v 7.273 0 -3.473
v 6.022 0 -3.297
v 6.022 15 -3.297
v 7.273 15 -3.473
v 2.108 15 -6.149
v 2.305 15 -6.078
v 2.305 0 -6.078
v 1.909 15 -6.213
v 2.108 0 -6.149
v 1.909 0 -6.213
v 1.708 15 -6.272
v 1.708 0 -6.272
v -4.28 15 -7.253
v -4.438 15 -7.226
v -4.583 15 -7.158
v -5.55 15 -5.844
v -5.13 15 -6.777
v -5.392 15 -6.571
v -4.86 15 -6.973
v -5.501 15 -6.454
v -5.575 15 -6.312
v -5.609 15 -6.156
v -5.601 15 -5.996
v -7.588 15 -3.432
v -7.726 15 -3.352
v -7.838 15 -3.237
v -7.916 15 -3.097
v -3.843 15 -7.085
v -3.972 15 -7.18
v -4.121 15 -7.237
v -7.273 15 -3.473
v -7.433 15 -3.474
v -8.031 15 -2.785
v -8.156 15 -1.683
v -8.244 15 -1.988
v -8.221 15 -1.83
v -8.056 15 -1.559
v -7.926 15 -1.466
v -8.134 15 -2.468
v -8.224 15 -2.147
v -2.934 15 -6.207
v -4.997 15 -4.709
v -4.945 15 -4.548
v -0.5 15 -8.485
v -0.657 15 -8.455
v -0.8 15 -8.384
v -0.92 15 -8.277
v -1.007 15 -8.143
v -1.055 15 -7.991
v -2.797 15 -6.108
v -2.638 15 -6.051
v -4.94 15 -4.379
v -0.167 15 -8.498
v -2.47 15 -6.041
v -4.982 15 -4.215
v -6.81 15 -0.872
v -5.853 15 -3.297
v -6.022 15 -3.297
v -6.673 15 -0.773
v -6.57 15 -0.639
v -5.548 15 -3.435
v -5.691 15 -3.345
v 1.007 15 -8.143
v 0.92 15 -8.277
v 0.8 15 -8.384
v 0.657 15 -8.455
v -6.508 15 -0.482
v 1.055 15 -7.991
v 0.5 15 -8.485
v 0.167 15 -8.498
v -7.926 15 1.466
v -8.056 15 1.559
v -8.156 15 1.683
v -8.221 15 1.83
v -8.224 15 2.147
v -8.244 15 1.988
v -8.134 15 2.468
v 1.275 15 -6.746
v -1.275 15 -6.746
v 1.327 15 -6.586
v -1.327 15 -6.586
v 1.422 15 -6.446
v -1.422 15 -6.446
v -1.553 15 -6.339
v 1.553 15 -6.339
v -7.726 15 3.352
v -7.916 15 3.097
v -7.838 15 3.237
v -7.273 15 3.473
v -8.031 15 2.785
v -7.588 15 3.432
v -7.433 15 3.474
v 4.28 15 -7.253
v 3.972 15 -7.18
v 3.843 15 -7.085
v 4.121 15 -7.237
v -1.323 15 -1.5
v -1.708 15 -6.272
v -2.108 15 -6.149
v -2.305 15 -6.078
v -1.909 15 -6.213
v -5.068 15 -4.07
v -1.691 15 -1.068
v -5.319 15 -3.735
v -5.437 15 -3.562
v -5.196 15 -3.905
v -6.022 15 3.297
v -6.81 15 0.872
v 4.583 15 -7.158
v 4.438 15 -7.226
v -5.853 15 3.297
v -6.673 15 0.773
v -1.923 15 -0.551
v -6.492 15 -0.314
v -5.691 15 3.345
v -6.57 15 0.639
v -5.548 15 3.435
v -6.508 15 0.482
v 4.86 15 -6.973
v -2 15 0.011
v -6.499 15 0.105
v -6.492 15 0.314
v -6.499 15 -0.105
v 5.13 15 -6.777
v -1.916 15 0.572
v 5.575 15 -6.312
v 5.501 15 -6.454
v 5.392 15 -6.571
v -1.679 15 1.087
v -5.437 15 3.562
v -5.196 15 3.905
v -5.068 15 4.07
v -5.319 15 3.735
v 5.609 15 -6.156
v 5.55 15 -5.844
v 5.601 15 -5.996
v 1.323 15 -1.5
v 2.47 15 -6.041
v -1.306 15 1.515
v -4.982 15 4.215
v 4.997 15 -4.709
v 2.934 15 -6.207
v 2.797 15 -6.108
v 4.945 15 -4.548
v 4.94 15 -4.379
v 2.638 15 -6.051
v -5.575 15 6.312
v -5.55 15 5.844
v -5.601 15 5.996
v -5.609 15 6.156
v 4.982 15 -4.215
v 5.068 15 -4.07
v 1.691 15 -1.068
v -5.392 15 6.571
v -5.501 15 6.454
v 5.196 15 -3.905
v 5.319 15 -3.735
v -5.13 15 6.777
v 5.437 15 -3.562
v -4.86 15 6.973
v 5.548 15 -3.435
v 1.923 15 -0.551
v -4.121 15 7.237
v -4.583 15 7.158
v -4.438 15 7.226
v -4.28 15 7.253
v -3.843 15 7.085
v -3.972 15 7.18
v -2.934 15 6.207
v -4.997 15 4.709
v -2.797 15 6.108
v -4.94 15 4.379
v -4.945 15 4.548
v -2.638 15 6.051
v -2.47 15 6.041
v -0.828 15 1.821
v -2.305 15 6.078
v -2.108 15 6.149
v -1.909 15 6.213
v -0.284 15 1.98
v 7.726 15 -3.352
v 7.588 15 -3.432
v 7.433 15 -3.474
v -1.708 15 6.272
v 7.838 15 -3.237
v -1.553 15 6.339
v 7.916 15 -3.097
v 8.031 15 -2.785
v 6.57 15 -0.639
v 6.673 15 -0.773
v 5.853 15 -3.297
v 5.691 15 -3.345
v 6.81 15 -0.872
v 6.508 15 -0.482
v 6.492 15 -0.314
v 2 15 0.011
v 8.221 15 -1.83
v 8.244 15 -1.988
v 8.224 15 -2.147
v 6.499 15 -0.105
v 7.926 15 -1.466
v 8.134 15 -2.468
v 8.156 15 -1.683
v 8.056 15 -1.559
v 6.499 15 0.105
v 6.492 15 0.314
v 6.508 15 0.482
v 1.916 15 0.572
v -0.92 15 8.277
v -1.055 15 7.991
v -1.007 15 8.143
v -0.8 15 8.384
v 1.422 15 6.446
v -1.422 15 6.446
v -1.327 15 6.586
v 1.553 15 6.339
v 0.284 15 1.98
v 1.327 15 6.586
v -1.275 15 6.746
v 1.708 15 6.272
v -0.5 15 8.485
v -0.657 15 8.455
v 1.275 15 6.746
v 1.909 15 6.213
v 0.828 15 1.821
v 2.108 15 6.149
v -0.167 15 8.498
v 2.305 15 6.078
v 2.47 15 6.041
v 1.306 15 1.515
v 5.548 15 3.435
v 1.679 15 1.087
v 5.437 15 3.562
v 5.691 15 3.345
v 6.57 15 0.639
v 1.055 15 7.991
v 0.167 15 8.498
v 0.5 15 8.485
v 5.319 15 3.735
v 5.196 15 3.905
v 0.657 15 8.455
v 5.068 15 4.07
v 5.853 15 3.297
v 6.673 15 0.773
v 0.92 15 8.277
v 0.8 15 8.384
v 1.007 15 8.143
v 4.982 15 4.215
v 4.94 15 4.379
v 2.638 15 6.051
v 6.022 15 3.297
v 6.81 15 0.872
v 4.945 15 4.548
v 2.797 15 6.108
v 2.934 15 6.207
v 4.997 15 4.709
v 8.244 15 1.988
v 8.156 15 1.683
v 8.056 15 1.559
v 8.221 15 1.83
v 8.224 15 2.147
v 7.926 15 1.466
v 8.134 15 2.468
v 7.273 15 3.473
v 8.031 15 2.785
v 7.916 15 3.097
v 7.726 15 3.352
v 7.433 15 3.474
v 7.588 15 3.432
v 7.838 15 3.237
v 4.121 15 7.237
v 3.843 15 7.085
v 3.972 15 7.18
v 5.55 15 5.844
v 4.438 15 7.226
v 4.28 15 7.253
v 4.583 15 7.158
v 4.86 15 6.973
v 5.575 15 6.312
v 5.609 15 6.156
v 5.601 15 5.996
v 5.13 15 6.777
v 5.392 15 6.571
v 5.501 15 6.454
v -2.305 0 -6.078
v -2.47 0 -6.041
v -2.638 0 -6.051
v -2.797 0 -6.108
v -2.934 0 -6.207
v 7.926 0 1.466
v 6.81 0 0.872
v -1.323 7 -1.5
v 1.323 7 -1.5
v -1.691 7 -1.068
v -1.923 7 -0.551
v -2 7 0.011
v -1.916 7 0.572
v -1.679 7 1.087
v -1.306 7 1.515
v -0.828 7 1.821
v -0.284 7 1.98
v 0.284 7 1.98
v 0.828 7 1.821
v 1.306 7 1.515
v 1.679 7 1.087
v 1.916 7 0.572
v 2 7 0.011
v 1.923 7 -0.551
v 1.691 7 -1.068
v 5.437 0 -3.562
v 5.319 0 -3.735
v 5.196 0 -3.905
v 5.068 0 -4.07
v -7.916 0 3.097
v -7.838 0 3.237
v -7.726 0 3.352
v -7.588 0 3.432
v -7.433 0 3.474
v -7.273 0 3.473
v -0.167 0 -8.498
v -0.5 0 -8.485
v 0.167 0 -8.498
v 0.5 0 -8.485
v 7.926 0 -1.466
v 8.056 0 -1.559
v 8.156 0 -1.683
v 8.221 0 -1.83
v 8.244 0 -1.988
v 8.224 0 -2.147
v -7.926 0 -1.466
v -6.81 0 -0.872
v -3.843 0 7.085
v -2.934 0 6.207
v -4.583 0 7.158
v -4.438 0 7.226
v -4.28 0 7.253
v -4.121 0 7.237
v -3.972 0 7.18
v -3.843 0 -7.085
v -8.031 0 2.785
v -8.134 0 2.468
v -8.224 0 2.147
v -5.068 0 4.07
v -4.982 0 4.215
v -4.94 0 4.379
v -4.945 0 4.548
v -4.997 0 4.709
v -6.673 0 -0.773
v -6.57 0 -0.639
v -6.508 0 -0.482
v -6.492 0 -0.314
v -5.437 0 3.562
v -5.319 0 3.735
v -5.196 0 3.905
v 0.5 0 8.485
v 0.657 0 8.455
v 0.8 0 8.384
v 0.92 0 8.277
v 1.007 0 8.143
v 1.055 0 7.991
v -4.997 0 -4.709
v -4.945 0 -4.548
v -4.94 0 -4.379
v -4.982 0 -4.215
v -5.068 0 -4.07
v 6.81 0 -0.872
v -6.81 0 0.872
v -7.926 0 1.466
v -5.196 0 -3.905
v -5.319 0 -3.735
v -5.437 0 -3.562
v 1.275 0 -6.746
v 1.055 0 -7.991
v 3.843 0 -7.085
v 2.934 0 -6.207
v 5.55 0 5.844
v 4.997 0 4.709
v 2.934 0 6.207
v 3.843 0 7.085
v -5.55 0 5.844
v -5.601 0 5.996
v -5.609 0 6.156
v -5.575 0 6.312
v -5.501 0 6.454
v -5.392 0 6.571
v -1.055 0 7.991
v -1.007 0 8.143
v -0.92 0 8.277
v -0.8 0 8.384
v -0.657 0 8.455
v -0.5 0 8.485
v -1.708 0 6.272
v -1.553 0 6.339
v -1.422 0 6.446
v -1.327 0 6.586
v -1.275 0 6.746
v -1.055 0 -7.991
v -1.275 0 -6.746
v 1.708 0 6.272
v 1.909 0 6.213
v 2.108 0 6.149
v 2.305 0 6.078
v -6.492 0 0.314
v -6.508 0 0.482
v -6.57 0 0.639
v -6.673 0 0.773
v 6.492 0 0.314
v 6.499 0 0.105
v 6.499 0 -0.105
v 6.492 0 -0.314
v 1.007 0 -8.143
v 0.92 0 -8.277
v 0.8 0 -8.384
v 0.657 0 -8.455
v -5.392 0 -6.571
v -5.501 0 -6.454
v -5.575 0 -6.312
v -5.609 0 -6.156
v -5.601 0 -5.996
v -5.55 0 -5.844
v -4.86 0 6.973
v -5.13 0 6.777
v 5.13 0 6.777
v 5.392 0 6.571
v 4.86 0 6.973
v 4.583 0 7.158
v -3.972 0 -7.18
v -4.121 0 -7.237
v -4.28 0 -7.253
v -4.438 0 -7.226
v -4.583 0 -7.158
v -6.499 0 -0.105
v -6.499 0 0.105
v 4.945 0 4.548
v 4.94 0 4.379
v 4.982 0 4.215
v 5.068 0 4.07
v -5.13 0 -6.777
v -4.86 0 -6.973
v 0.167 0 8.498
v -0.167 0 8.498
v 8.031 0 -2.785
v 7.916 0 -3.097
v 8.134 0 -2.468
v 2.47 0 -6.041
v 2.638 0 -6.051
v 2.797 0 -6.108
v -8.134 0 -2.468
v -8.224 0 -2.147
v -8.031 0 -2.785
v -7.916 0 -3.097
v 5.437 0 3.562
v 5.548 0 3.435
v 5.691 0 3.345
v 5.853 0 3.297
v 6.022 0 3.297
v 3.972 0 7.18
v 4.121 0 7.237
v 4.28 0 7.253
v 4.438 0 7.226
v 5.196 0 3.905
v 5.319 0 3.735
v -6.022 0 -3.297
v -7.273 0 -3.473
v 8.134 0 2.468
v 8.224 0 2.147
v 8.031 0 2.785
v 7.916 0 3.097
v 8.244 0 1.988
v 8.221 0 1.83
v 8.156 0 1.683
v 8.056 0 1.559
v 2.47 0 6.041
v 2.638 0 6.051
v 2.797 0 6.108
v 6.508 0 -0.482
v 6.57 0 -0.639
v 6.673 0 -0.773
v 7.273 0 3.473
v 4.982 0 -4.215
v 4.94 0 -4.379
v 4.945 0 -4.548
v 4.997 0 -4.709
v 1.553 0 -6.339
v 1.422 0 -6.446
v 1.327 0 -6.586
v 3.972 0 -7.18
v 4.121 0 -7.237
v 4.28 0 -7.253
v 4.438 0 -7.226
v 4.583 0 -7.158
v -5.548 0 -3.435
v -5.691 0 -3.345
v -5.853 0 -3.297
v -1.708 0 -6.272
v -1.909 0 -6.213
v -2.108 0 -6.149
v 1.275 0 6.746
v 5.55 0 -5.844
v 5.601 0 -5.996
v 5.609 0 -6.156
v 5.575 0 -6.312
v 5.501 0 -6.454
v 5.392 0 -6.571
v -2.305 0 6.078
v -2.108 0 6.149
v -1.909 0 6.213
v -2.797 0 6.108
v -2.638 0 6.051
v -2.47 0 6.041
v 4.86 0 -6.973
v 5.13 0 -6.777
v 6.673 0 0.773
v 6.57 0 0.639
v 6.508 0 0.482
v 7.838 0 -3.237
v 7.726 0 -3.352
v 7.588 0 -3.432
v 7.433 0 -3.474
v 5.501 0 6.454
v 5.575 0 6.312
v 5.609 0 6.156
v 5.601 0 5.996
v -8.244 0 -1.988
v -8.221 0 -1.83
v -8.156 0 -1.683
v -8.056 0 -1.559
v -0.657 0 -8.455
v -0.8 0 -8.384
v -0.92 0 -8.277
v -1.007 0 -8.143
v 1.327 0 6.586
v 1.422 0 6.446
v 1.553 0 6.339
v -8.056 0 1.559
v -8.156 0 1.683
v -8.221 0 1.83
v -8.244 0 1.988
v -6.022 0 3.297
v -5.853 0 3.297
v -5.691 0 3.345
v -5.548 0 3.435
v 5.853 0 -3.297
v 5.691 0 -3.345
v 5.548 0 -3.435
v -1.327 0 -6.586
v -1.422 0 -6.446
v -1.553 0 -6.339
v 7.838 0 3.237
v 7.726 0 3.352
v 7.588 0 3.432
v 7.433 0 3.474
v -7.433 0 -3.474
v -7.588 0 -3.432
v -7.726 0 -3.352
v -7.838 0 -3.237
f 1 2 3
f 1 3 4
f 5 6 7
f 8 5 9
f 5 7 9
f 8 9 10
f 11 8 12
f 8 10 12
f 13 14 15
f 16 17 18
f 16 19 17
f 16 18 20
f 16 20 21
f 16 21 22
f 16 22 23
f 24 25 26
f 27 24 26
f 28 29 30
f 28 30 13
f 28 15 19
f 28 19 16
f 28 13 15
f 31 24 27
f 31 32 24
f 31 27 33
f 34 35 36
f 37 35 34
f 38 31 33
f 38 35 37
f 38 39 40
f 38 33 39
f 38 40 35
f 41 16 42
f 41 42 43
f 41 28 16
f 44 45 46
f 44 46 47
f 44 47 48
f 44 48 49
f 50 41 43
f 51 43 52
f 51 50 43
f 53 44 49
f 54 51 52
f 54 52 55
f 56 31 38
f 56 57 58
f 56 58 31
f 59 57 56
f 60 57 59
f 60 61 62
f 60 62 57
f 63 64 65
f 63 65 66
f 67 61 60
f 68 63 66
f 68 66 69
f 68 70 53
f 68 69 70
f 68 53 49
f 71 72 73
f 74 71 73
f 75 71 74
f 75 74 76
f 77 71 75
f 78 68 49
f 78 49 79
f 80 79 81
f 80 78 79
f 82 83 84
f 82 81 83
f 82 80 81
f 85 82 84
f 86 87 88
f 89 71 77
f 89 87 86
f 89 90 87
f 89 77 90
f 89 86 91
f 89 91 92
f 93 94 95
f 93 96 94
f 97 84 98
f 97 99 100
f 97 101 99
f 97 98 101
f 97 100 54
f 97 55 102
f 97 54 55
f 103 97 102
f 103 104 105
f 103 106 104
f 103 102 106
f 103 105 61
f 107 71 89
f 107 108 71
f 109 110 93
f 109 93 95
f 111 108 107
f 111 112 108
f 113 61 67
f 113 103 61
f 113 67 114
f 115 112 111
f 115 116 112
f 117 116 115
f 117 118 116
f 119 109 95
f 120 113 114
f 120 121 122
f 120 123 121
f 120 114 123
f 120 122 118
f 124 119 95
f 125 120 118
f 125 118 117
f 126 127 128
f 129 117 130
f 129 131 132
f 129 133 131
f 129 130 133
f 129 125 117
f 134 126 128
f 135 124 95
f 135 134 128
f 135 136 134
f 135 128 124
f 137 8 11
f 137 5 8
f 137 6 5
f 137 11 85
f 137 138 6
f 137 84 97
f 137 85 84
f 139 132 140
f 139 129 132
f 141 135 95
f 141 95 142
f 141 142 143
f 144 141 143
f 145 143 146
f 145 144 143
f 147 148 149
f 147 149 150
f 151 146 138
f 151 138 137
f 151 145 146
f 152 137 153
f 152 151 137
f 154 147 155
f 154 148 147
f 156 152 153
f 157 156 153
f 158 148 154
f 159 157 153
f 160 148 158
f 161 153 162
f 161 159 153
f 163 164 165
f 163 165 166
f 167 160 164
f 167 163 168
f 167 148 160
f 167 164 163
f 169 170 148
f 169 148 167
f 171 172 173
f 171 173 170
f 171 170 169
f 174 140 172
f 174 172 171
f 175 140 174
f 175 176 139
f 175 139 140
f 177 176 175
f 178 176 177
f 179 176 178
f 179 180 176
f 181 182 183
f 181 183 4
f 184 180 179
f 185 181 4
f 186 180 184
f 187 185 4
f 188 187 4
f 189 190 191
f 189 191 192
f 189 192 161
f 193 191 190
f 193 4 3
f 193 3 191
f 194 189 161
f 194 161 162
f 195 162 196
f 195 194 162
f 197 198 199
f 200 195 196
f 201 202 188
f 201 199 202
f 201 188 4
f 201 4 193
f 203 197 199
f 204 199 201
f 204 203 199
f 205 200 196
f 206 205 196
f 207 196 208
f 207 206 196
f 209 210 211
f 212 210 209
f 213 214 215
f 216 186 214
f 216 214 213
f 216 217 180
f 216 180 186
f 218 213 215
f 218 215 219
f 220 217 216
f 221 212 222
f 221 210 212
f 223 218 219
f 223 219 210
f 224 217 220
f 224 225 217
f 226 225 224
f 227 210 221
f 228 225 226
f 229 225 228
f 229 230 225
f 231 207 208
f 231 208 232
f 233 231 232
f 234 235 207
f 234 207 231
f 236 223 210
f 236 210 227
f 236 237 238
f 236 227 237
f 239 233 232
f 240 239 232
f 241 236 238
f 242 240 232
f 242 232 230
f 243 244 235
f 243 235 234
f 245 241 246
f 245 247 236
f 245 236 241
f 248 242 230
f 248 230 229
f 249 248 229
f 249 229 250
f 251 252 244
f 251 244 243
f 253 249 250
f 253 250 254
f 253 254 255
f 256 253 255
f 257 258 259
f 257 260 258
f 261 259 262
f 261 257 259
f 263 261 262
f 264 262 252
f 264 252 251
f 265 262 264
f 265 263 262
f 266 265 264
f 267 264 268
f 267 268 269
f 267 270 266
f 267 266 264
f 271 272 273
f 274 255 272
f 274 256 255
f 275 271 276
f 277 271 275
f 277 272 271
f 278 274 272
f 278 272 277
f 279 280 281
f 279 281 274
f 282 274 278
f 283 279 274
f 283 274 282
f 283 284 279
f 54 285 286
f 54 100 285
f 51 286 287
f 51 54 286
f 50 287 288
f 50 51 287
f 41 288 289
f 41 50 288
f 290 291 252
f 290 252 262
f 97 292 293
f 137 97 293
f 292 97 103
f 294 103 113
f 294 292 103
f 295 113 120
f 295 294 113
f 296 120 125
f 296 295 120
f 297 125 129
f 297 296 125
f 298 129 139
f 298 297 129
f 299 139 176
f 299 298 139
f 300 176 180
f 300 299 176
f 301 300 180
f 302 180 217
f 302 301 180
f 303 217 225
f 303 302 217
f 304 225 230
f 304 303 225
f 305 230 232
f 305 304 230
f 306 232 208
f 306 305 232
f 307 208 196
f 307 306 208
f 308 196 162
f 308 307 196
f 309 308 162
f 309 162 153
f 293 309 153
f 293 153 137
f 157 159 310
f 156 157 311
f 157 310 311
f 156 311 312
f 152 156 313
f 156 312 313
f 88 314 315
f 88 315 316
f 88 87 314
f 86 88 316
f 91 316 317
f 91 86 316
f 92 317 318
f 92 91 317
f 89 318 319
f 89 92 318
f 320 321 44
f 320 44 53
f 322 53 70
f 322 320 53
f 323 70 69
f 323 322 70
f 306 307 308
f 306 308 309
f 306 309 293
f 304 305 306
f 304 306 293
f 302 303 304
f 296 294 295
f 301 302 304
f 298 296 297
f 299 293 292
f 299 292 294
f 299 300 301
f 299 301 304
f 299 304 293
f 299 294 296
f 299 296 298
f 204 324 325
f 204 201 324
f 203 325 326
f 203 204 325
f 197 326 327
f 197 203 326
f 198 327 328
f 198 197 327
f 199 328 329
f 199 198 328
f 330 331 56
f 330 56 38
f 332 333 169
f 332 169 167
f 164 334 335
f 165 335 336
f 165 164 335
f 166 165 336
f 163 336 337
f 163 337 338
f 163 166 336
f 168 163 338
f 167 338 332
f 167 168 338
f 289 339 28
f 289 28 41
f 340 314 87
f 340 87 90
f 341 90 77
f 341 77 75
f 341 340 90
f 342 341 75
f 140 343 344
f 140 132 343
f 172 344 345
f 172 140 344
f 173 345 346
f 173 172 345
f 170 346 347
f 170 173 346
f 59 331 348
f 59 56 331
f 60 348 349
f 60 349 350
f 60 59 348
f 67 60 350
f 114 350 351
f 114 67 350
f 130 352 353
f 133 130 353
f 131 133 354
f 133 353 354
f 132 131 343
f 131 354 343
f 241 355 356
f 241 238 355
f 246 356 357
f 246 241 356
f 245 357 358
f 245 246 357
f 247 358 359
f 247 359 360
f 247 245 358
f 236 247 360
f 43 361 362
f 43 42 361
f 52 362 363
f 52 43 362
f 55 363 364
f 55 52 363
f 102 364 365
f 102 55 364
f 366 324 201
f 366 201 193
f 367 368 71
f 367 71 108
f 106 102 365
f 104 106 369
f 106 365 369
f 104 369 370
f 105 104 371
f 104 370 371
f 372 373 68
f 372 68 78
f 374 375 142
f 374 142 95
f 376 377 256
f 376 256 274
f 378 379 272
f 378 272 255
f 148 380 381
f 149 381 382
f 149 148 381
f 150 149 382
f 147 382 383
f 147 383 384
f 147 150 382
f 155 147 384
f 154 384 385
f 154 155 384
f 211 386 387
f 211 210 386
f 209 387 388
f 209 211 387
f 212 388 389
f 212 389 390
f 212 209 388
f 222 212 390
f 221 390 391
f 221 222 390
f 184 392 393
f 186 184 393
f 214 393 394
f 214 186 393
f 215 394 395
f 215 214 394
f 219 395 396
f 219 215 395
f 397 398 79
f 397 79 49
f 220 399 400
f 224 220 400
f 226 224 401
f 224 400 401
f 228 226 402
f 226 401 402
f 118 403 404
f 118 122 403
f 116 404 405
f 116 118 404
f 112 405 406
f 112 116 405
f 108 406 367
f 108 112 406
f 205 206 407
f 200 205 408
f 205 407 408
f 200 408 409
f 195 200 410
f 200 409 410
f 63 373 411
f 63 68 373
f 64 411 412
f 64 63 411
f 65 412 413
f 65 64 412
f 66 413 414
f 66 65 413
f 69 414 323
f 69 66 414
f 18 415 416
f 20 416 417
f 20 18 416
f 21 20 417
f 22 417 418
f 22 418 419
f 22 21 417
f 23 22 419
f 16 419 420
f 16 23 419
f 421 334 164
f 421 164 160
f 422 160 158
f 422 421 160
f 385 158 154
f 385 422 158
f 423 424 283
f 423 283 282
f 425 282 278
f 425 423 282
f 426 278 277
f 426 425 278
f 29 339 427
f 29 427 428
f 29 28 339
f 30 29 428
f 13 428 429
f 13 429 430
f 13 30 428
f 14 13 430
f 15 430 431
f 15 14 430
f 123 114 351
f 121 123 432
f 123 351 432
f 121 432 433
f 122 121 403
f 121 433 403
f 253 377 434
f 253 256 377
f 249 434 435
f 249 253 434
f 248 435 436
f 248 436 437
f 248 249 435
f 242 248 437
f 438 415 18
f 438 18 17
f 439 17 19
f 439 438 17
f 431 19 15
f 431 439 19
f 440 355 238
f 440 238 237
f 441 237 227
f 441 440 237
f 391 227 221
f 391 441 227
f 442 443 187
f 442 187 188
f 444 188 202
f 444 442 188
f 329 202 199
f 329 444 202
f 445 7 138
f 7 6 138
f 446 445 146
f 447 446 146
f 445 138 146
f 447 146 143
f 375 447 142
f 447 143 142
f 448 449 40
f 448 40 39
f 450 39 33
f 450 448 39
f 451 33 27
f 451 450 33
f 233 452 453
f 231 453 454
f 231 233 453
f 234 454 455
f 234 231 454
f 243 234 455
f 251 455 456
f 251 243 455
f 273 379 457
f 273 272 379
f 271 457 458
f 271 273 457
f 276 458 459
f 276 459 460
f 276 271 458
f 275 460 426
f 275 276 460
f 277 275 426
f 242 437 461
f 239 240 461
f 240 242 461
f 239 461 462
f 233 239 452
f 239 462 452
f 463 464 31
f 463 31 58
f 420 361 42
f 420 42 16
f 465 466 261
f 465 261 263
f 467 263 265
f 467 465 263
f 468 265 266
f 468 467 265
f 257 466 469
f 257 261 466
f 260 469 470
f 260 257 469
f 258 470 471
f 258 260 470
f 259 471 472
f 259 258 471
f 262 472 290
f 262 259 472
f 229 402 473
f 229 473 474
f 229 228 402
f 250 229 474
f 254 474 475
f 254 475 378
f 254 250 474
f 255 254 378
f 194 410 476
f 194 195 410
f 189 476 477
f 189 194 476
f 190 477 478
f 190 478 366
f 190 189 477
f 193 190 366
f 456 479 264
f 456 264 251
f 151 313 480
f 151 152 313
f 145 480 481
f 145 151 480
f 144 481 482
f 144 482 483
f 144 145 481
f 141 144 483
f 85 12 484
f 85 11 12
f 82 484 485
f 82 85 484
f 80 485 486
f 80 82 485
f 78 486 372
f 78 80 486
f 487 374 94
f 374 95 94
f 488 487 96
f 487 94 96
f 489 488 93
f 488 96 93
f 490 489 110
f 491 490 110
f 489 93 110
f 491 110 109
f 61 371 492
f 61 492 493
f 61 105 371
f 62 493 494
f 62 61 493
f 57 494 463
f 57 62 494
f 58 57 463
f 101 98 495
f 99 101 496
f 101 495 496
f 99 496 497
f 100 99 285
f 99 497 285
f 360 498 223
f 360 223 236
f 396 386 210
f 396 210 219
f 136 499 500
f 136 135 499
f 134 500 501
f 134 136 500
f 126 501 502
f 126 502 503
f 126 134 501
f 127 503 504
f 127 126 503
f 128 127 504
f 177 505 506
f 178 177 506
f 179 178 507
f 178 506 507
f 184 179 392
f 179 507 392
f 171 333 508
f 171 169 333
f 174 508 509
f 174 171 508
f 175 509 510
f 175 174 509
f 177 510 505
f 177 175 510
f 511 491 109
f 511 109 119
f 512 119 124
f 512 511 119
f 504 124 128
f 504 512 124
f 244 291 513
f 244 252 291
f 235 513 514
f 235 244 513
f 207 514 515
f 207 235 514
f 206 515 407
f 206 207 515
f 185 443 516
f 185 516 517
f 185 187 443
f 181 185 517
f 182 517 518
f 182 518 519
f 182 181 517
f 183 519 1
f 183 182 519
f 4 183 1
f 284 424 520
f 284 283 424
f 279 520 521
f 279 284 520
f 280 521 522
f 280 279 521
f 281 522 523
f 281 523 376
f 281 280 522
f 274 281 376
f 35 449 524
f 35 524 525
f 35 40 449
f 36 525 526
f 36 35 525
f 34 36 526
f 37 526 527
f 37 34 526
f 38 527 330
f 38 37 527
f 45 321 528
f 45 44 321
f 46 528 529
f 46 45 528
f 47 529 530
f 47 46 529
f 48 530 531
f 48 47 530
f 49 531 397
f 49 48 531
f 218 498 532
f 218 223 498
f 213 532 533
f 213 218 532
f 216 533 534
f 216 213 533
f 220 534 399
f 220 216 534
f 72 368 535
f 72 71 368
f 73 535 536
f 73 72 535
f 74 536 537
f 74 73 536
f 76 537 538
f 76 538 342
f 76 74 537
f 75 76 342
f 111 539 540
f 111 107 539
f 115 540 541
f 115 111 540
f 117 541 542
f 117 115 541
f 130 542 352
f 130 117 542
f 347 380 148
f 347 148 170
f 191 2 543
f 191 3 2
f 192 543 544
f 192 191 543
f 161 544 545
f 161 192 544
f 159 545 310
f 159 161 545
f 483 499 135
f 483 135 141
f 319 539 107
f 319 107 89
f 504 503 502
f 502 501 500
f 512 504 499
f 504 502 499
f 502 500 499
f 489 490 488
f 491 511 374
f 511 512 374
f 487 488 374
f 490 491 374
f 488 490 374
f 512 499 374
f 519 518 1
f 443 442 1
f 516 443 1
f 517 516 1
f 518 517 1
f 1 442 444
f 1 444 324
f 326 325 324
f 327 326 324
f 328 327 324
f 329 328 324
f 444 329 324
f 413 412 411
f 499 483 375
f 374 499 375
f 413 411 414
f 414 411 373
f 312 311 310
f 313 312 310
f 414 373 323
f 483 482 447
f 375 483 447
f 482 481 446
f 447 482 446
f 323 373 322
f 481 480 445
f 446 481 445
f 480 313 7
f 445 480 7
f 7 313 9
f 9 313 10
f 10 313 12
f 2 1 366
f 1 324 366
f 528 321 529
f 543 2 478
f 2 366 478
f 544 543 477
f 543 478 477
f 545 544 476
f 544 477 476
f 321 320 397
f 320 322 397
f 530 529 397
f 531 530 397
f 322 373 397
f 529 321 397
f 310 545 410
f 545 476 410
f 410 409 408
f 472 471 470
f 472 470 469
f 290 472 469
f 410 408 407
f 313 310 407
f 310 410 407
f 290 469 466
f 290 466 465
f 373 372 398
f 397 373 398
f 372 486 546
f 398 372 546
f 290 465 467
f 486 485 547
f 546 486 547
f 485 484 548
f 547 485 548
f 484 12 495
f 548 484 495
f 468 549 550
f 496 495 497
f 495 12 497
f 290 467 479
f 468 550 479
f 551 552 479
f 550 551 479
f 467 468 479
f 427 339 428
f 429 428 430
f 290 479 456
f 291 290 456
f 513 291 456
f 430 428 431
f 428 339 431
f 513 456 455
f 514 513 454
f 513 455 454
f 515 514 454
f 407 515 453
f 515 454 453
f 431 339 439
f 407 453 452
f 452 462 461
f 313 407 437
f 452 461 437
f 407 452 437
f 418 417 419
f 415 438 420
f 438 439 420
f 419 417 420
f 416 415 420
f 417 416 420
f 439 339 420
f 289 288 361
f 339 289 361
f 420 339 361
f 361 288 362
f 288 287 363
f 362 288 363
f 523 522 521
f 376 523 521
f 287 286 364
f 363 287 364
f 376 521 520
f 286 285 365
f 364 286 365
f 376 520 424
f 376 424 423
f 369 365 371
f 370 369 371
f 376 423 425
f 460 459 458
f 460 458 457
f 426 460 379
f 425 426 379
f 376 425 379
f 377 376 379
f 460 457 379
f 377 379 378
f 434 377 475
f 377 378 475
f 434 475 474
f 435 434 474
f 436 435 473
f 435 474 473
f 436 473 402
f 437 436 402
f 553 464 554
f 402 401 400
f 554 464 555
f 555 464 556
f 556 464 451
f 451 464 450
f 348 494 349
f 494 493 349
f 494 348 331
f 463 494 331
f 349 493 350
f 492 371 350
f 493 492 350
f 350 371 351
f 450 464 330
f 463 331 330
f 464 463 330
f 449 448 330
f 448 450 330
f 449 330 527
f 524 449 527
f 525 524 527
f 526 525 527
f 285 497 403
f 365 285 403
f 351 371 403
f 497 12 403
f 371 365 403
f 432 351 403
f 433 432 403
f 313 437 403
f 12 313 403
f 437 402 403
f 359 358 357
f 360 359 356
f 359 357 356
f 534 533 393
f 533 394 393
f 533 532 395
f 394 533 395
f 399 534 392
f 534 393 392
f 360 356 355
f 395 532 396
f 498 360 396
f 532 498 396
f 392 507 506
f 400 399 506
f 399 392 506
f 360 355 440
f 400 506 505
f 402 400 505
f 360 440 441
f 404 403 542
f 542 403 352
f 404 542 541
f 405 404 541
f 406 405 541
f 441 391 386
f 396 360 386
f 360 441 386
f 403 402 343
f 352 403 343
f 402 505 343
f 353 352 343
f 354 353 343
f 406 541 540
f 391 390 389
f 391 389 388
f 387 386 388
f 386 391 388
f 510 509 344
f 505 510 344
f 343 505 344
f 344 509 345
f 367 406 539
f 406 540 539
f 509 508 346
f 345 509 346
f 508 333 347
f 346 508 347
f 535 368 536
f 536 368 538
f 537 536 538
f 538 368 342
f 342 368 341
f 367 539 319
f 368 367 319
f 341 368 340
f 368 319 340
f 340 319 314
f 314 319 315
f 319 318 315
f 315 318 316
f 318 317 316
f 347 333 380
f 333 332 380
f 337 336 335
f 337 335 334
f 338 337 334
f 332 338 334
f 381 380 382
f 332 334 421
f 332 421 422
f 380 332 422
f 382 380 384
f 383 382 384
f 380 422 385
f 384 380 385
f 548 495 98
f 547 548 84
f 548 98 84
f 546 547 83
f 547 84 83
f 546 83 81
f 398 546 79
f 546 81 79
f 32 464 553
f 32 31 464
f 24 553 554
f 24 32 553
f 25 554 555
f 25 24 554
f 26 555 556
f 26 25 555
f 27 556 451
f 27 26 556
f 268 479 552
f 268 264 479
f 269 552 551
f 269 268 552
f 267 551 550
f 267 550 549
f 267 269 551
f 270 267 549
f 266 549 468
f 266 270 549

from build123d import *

# Parameters (mm, degrees)
SKETCH1_R                = 6.5
SKETCH1_R_2              = 2
BOSS_EXTRUDE1_DEPTH      = 15
BOSS_EXTRUDE2_START      = -15
BOSS_EXTRUDE2_DEPTH      = 15
FILLET1_R                = 0.6
CIRPATTERN1_COUNT        = 10
FILLET1_OF_CIRPATTERN1_R = 0.6
BOSS_EXTRUDE3_START      = -15
BOSS_EXTRUDE3_DEPTH      = 15
BOSS_EXTRUDE4_DEPTH      = 7


with BuildPart() as part:
    # Sketch1 → Boss-Extrude1 (new body)
    with BuildSketch(Plane(origin=(0, 0, 0), x_dir=(1, 0, 0), z_dir=(0, 1, 0))):
        with Locations(Location((0, 0, 0), (0, 0, 270))):
            Circle(SKETCH1_R)
        with Locations(Location((0, 0, 0), (0, 0, 270))):
            Circle(SKETCH1_R_2, mode=Mode.SUBTRACT)
    extrude(amount=BOSS_EXTRUDE1_DEPTH)

    # Sketch2 → Boss-Extrude2 (add)
    with BuildSketch(Plane(origin=(0, 15, 0), x_dir=(1, 0, 0), z_dir=(0, 1, 0)).offset(BOSS_EXTRUDE2_START)):
        with BuildLine():
            Line((0.975354337, 8.443854802), (1.342832983, 6.359779837))
            ThreePointArc((1.342832983, 6.359779837), (0, 6.5), (-1.342832983, 6.359779837))
            Line((-1.342832983, 6.359779837), (-0.975354337, 8.443854802))
            ThreePointArc((-0.975354337, 8.443854802), (0, 8.5), (0.975354337, 8.443854802))
        make_face()
    boss_extrude2 = extrude(amount=BOSS_EXTRUDE2_DEPTH)

    # Fillet1
    fillet1_edges = [part.edges().sort_by_distance(p)[0] for p in [
        (-0.975354337, 7.5, -8.443854802),
        (0.975354337, 7.5, -8.443854802),
        (1.342832983, 7.5, -6.359779837),
        (-1.342832983, 7.5, -6.359779837),
    ]]
    fillet(fillet1_edges, radius=FILLET1_R)

    # CirPattern1: Boss-Extrude2 ×10 about axis
    cirpattern1_axis = Axis((0, 0, 0), (0, 1, 0))
    for i in range(1, CIRPATTERN1_COUNT):
        add(boss_extrude2.rotate(cirpattern1_axis, i * 360 / CIRPATTERN1_COUNT))

    # Fillet1 of CirPattern1
    fillet1_of_cirpattern1_edges = [part.edges().sort_by_distance(p)[0] for p in [
        (-5.752251559, 7.5, -6.257923138),
        (-4.174095091, 7.5, -7.404520928),
        (-2.651810092, 7.5, -5.934467393),
        (-4.8245595, 7.5, -4.355872545),
        (-8.331984198, 7.5, -1.681677534),
        (-7.729182066, 7.5, -3.53691173),
        (-5.633551844, 7.5, -3.242390109),
        (-6.463468269, 7.5, -0.688169991),
        (-7.729182066, 7.5, 3.53691173),
        (-8.331984198, 7.5, 1.681677534),
        (-6.463468269, 7.5, 0.688169991),
        (-5.633551844, 7.5, 3.242390109),
        (-4.174095091, 7.5, 7.404520928),
        (-5.752251559, 7.5, 6.257923138),
        (-4.8245595, 7.5, 4.355872545),
        (-2.651810092, 7.5, 5.934467393),
        (0.975354337, 7.5, 8.443854802),
        (-0.975354337, 7.5, 8.443854802),
        (-1.342832983, 7.5, 6.359779837),
        (1.342832983, 7.5, 6.359779837),
        (5.752251559, 7.5, 6.257923138),
        (4.174095091, 7.5, 7.404520928),
        (2.651810092, 7.5, 5.934467393),
        (4.8245595, 7.5, 4.355872545),
        (8.331984198, 7.5, 1.681677534),
        (7.729182066, 7.5, 3.53691173),
        (5.633551844, 7.5, 3.242390109),
        (6.463468269, 7.5, 0.688169991),
        (7.729182066, 7.5, -3.53691173),
        (8.331984198, 7.5, -1.681677534),
        (6.463468269, 7.5, -0.688169991),
        (5.633551844, 7.5, -3.242390109),
        (4.174095091, 7.5, -7.404520928),
        (5.752251559, 7.5, -6.257923138),
        (4.8245595, 7.5, -4.355872545),
        (2.651810092, 7.5, -5.934467393),
    ]]
    fillet(fillet1_of_cirpattern1_edges, radius=FILLET1_OF_CIRPATTERN1_R)

    # Sketch3 → Boss-Extrude3 (add)
    with BuildSketch(Plane(origin=(0, 15, 0), x_dir=(1, 0, 0), z_dir=(0, 1, 0)).offset(BOSS_EXTRUDE3_START)):
        with BuildLine():
            Line((-1.322875656, 1.5), (1.322875656, 1.5))
            ThreePointArc((1.322875656, 1.5), (0, 2), (-1.322875656, 1.5))
        make_face()
    extrude(amount=BOSS_EXTRUDE3_DEPTH)

    # Sketch4 → Boss-Extrude4 (add)
    with BuildSketch(Plane.XZ):
        with BuildLine():
            Line((1.322875656, -1.5), (-1.322875656, -1.5))
            ThreePointArc((-1.322875656, -1.5), (0, 2), (1.322875656, -1.5))
        make_face()
    extrude(amount=-BOSS_EXTRUDE4_DEPTH)


solid = part.part
